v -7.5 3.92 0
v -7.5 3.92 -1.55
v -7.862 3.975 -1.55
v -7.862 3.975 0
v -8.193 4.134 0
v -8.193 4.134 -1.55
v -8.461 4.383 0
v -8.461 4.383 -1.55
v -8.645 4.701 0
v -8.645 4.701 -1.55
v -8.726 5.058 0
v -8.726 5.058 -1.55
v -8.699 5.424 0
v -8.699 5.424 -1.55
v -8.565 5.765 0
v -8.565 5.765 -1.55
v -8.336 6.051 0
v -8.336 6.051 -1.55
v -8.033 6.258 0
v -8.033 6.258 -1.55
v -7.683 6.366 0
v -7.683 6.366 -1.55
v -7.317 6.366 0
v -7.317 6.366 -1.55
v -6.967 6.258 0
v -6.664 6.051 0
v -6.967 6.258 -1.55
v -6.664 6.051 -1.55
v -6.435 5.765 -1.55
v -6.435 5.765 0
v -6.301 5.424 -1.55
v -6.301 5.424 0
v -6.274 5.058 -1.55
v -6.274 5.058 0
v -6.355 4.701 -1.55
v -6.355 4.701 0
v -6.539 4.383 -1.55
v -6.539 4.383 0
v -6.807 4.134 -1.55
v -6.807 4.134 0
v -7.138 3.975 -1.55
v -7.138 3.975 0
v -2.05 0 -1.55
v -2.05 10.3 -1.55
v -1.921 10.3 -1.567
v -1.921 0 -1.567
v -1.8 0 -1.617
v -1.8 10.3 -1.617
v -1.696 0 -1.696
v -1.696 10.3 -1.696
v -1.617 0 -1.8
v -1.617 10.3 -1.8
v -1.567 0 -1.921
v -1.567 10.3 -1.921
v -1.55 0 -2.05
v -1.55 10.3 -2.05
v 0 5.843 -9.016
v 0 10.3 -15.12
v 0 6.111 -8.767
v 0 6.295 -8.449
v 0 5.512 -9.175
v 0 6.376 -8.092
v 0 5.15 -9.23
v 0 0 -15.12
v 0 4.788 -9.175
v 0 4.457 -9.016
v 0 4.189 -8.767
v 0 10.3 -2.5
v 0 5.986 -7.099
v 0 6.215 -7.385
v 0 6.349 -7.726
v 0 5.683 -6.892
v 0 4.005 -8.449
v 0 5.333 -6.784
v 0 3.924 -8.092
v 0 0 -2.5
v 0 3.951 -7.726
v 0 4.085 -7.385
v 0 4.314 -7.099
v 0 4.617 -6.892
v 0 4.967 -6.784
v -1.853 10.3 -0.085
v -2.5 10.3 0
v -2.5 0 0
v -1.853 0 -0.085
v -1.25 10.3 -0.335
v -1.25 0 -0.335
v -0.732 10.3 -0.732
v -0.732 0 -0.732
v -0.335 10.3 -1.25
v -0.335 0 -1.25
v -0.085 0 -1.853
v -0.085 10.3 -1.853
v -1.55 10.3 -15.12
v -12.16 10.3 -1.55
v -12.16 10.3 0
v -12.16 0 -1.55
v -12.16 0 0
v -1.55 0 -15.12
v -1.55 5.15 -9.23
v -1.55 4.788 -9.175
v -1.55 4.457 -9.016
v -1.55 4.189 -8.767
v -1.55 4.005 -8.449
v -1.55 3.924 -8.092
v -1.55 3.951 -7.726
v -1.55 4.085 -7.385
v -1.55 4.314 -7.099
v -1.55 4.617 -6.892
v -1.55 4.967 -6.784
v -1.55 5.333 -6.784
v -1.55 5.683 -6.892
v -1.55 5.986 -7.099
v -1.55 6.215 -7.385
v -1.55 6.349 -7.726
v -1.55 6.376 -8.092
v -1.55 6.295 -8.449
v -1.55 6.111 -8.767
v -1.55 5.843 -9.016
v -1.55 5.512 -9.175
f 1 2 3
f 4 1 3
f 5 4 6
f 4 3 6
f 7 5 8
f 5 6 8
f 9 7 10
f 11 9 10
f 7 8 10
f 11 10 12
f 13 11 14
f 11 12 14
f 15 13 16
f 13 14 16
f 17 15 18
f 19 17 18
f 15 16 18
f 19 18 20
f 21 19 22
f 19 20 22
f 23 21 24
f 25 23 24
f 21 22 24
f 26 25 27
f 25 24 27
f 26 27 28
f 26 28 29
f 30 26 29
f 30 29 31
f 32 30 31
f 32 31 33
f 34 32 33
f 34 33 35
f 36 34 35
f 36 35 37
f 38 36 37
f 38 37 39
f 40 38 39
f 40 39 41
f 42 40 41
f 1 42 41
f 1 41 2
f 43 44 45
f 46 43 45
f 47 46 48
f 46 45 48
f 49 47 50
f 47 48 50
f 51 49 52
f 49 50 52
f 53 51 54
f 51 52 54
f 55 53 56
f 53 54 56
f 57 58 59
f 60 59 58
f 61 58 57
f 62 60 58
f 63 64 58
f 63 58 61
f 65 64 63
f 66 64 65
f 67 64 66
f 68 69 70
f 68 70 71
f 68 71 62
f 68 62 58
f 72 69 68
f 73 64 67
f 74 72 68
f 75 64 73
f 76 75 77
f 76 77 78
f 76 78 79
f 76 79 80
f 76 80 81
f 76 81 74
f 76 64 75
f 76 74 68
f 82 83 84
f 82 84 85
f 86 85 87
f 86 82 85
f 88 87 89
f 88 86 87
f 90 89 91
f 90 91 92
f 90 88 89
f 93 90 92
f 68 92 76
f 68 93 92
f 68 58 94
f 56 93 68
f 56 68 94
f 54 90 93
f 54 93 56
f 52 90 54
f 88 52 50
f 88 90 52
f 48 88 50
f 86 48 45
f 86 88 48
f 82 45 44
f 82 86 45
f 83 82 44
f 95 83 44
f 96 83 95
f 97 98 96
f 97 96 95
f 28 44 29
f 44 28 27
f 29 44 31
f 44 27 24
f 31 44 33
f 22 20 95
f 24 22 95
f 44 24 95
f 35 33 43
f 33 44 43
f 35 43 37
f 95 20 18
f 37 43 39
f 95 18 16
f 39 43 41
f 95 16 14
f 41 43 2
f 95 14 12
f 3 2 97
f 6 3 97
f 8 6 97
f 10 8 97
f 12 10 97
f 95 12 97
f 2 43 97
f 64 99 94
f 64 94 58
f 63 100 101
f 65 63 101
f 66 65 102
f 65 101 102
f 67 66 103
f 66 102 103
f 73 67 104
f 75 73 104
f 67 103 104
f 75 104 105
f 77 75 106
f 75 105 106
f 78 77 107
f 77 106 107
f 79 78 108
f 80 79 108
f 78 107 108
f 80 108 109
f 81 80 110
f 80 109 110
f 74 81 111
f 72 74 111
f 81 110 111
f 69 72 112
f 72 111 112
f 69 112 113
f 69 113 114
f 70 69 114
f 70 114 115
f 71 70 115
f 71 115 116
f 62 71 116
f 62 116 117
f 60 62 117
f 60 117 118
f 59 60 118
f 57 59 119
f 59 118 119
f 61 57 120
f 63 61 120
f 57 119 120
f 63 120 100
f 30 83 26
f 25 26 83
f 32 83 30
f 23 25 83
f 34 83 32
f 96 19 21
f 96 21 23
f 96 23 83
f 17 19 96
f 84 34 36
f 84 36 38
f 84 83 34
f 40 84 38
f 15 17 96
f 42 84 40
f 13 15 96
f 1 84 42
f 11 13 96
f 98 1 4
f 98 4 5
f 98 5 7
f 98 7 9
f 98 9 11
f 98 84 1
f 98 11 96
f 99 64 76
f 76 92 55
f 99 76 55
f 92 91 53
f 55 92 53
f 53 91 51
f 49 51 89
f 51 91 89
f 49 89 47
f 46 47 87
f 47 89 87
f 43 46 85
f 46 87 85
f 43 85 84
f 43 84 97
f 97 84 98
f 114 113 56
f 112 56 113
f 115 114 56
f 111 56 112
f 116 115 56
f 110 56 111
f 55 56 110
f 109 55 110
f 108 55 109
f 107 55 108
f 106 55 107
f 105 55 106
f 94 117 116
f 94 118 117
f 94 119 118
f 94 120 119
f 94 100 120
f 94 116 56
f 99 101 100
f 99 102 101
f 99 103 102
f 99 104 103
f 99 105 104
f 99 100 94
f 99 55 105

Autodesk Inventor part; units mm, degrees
ref_plane "YZ Plane" through (0, 0, 0) normal (1, 0, 0) x (0, 1, 0)
ref_plane "XZ Plane" through (0, 0, 0) normal (0, 1, 0) x (-1, 0, 0)
ref_plane "XY Plane" through (0, 0, 0) normal (0, 0, 1) x (1, 0, 0)
sketch "Sketch1" plane through (0, 0, 0) normal (0, 1, 0) x (-1, 0, 0)
  line L0 (0, 0) -> (12.16, 0)
  line L1 (12.16, 0) -> (12.16, -1.55)
  line L2 (1.55, -15.12) -> (0, -15.12)
  line L3 (0, -15.12) -> (0, 0)
  line L4 (10.61, -1.55) -> (1.55, -1.55)
  line L5 (1.55, -1.55) -> (1.55, -13.57)
  line L6 (10.61, -1.55) -> (12.16, -1.55)
  line L7 (1.55, -13.57) -> (1.55, -15.12)
  dimension "d2" = 1.55
  dimension "d3" = 12.16
  dimension "d4" = 15.12
extrude "Extrusion1" add sketch "Sketch1" along normal blind 10.3
sketch "Sketch2" plane through (-12.16, 0, 0) normal (0, 0, 1) x (1, 0, 0)
  line L0 (4.66, 14.5613) -> (4.66, -2.7265)
  line L1 (12.16, 0) -> (12.16, 10.3) projected
  line L2 (-7.6119, 5.15) -> (15.8963, 5.15)
  point P0 (12.16, 5.15)
  point P1 (4.66, 5.15)
  dimension "d7" = 7.5
hole "Hole1" at (-7.5, 5.15, 0) direction (0, 0, -1) diameter 2.459 end through all thread size "M3x0.5" class "6H" standard "ANSI Metric M Profile"
sketch "Sketch3" plane through (0, 0, 0) normal (1, 0, 0) x (0, 0, -1)
  line L0 (-10.3606, 5.15) -> (23.1245, 5.15)
  line L1 (8, 14.2786) -> (8, -6.8061)
  line L2 (0, 0) -> (0, 10.3) projected
  point P0 (0, 5.15)
  point P1 (8, 5.15)
  dimension "d15" = 8
hole "Hole2" at (0, 5.15, -8) direction (-1, 0, 0) diameter 2.459 end through all thread size "M3x0.5" class "6H" standard "ANSI Metric M Profile"
fillet "Fillet1" radius 2.5 1 edges at (0, 5.15, 0)
fillet "Fillet2" radius 0.5 1 edges at (-1.55, 5.15, -1.55)
properties part number "Threaded Right Support Farnell1466885"
